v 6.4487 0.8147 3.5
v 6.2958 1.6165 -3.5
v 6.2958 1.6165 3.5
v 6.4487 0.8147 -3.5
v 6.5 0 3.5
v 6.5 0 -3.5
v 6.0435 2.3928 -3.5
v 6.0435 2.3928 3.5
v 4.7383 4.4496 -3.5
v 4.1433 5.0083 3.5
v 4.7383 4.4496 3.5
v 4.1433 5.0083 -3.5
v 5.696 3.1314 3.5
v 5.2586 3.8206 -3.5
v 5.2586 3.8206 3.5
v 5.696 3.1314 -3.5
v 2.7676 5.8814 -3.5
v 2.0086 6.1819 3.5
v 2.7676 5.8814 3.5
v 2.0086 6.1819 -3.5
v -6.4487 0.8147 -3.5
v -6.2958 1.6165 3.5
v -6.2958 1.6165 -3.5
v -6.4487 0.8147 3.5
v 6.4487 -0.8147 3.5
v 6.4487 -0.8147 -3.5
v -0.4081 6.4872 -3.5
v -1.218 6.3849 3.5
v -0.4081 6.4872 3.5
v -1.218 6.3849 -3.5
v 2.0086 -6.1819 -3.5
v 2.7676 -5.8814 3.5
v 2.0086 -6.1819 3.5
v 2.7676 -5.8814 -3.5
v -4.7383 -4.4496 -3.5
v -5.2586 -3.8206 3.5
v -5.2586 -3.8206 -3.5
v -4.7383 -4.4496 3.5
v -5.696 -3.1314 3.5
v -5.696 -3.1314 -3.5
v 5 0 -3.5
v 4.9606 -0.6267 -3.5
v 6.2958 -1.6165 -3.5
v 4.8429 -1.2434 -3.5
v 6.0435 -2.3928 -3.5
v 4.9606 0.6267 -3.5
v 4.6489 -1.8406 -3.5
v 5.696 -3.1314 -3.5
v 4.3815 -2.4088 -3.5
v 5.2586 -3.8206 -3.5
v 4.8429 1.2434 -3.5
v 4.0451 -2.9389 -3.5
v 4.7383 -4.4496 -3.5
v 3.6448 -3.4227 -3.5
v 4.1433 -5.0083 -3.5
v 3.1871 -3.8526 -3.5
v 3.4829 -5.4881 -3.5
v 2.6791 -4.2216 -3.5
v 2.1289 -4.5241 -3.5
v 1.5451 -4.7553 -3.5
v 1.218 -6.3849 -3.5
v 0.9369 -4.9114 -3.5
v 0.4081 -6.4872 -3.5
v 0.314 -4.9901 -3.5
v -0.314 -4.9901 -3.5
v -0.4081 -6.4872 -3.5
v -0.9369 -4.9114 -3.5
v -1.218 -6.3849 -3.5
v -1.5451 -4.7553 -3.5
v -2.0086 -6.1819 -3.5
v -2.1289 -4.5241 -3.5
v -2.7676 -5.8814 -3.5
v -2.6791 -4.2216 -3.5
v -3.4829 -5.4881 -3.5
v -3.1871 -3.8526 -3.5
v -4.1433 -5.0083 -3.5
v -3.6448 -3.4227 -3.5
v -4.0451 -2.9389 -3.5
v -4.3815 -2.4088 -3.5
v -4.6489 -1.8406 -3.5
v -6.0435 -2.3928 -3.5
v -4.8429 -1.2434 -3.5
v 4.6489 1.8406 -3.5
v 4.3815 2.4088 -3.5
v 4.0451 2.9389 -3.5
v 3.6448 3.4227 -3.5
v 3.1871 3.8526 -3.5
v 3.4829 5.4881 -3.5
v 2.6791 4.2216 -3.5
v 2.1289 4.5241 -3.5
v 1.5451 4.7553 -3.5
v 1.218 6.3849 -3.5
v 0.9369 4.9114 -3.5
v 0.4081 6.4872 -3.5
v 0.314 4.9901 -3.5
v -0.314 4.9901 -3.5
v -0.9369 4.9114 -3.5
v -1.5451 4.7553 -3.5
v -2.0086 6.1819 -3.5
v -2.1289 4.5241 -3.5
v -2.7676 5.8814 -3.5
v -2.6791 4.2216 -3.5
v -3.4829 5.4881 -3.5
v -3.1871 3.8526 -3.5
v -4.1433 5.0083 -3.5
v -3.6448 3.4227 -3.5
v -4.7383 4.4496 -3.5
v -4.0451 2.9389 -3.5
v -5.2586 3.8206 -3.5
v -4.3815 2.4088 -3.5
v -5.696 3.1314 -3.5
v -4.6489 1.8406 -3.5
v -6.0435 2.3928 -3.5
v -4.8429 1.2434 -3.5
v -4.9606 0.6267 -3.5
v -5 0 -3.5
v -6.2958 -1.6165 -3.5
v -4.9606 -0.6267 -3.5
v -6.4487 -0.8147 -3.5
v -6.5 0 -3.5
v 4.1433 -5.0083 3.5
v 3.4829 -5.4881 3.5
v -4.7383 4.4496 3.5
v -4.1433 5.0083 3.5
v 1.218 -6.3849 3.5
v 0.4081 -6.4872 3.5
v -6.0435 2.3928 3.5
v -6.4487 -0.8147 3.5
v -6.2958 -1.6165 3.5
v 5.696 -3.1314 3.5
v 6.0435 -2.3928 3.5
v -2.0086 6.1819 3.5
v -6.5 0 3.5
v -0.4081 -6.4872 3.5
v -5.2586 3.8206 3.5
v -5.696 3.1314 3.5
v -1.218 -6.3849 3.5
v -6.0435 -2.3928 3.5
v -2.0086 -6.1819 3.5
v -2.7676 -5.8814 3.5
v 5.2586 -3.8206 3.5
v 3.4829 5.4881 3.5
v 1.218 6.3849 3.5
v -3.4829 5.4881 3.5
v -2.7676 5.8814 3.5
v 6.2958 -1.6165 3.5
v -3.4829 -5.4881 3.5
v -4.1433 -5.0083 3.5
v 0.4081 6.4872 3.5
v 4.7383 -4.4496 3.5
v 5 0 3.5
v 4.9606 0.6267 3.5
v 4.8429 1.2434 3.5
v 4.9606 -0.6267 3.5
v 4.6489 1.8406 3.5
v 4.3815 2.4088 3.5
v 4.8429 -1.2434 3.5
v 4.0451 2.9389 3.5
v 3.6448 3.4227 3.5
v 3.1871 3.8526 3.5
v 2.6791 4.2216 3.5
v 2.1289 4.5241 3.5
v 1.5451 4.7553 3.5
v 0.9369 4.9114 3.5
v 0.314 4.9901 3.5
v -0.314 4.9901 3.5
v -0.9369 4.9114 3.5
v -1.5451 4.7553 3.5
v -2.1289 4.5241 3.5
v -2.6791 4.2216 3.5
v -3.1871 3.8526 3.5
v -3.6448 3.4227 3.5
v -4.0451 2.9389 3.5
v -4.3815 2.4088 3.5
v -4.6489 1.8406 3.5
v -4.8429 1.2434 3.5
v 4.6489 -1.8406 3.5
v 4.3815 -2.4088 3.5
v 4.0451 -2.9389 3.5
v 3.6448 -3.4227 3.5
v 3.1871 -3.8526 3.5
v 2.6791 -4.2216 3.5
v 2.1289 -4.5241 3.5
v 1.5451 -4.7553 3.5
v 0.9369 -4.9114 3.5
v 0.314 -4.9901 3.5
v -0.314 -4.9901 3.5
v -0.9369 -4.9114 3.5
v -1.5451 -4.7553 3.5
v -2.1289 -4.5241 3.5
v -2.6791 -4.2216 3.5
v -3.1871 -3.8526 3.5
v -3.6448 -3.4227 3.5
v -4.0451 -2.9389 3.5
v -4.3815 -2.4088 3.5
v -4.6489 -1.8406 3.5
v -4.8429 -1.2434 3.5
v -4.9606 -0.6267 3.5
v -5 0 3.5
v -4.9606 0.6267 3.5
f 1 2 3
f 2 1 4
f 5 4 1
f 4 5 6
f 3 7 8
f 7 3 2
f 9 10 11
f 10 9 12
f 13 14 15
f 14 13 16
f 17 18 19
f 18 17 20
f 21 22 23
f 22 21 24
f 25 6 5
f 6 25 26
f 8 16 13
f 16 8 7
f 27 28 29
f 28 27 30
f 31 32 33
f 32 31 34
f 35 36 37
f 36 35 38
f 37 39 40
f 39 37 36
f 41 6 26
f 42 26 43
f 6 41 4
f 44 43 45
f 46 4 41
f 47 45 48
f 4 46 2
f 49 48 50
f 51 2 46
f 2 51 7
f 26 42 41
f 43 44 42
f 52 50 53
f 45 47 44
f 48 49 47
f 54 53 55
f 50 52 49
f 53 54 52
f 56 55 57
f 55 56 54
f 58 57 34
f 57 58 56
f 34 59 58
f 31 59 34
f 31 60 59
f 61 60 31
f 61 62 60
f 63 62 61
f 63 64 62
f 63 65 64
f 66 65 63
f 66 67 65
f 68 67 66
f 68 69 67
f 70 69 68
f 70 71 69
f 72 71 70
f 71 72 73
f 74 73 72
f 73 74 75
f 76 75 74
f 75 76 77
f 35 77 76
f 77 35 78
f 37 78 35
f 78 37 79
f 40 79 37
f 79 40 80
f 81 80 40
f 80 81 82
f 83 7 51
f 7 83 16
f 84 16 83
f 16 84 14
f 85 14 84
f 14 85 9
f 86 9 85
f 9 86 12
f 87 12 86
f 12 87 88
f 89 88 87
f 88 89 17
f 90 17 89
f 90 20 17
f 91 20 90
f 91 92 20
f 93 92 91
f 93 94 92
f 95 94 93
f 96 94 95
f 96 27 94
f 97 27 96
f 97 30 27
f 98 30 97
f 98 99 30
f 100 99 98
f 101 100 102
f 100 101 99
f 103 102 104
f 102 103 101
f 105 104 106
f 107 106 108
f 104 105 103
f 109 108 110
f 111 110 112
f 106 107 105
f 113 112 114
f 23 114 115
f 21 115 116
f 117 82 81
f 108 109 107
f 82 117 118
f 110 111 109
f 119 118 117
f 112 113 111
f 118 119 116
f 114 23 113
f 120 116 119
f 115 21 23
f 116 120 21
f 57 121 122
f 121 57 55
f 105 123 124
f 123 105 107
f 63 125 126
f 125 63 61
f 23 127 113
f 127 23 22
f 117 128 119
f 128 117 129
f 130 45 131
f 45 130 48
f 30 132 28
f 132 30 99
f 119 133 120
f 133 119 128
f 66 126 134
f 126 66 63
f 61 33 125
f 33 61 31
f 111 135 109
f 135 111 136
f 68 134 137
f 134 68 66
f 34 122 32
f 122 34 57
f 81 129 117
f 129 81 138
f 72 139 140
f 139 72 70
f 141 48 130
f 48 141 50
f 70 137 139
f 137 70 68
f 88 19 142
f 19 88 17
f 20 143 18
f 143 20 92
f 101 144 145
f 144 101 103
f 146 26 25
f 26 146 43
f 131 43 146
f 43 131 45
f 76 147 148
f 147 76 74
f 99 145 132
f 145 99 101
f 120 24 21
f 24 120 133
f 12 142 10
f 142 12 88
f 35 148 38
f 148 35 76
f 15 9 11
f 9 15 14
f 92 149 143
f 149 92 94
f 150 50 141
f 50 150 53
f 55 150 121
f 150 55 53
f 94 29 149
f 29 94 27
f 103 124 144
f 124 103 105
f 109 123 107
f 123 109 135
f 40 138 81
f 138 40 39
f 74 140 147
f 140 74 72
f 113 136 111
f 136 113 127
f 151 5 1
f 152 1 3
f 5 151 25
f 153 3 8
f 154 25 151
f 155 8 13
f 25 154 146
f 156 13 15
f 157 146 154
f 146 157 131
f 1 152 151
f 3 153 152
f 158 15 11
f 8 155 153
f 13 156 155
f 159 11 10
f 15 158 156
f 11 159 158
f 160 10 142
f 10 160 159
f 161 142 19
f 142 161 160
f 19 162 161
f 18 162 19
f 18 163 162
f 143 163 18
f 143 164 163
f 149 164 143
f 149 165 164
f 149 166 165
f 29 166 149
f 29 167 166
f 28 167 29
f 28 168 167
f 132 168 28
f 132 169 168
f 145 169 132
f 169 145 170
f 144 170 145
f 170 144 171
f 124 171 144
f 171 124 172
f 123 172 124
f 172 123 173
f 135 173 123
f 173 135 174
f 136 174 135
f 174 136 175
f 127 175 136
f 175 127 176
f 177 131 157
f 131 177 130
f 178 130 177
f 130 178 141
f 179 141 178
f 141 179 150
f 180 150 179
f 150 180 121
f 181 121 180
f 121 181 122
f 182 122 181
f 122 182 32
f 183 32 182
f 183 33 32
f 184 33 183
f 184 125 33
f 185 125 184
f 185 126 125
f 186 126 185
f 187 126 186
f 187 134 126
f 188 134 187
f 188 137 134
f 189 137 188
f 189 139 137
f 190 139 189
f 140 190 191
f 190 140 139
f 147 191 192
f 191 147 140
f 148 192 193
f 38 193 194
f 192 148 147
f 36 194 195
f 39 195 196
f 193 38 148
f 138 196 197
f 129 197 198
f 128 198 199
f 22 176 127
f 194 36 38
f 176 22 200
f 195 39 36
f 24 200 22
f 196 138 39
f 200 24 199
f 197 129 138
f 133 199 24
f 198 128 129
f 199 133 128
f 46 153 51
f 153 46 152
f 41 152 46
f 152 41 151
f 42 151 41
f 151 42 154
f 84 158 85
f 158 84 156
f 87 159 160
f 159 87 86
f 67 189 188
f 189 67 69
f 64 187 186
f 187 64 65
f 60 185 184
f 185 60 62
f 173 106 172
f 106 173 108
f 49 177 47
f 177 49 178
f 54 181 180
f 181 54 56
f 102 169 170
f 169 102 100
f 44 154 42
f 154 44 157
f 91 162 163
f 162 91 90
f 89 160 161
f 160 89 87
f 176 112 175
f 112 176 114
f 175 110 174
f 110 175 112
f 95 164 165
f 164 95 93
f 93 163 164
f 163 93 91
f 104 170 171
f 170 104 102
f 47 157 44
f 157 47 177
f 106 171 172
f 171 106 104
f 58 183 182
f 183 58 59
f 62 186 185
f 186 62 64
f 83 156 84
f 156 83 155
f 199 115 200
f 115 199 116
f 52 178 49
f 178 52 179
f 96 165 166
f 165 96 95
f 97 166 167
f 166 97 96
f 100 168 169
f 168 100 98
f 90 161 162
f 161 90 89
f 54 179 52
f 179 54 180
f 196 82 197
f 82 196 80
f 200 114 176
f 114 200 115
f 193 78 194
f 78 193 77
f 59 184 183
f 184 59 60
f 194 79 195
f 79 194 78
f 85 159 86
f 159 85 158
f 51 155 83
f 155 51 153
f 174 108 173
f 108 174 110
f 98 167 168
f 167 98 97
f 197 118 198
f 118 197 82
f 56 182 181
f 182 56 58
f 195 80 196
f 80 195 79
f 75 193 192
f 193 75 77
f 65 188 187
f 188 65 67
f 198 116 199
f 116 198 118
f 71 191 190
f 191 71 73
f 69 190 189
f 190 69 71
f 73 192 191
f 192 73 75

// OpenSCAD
$fn = 50;


difference() {
	union() {
		translate(v = [0, 0, -3.5000000000]) {
			cylinder(h = 7, r = 6.5000000000);
		}
	}
	union() {
		translate(v = [0, 0, -100.0000000000]) {
			cylinder(h = 200, r = 5.0000000000);
		}
	}
}
